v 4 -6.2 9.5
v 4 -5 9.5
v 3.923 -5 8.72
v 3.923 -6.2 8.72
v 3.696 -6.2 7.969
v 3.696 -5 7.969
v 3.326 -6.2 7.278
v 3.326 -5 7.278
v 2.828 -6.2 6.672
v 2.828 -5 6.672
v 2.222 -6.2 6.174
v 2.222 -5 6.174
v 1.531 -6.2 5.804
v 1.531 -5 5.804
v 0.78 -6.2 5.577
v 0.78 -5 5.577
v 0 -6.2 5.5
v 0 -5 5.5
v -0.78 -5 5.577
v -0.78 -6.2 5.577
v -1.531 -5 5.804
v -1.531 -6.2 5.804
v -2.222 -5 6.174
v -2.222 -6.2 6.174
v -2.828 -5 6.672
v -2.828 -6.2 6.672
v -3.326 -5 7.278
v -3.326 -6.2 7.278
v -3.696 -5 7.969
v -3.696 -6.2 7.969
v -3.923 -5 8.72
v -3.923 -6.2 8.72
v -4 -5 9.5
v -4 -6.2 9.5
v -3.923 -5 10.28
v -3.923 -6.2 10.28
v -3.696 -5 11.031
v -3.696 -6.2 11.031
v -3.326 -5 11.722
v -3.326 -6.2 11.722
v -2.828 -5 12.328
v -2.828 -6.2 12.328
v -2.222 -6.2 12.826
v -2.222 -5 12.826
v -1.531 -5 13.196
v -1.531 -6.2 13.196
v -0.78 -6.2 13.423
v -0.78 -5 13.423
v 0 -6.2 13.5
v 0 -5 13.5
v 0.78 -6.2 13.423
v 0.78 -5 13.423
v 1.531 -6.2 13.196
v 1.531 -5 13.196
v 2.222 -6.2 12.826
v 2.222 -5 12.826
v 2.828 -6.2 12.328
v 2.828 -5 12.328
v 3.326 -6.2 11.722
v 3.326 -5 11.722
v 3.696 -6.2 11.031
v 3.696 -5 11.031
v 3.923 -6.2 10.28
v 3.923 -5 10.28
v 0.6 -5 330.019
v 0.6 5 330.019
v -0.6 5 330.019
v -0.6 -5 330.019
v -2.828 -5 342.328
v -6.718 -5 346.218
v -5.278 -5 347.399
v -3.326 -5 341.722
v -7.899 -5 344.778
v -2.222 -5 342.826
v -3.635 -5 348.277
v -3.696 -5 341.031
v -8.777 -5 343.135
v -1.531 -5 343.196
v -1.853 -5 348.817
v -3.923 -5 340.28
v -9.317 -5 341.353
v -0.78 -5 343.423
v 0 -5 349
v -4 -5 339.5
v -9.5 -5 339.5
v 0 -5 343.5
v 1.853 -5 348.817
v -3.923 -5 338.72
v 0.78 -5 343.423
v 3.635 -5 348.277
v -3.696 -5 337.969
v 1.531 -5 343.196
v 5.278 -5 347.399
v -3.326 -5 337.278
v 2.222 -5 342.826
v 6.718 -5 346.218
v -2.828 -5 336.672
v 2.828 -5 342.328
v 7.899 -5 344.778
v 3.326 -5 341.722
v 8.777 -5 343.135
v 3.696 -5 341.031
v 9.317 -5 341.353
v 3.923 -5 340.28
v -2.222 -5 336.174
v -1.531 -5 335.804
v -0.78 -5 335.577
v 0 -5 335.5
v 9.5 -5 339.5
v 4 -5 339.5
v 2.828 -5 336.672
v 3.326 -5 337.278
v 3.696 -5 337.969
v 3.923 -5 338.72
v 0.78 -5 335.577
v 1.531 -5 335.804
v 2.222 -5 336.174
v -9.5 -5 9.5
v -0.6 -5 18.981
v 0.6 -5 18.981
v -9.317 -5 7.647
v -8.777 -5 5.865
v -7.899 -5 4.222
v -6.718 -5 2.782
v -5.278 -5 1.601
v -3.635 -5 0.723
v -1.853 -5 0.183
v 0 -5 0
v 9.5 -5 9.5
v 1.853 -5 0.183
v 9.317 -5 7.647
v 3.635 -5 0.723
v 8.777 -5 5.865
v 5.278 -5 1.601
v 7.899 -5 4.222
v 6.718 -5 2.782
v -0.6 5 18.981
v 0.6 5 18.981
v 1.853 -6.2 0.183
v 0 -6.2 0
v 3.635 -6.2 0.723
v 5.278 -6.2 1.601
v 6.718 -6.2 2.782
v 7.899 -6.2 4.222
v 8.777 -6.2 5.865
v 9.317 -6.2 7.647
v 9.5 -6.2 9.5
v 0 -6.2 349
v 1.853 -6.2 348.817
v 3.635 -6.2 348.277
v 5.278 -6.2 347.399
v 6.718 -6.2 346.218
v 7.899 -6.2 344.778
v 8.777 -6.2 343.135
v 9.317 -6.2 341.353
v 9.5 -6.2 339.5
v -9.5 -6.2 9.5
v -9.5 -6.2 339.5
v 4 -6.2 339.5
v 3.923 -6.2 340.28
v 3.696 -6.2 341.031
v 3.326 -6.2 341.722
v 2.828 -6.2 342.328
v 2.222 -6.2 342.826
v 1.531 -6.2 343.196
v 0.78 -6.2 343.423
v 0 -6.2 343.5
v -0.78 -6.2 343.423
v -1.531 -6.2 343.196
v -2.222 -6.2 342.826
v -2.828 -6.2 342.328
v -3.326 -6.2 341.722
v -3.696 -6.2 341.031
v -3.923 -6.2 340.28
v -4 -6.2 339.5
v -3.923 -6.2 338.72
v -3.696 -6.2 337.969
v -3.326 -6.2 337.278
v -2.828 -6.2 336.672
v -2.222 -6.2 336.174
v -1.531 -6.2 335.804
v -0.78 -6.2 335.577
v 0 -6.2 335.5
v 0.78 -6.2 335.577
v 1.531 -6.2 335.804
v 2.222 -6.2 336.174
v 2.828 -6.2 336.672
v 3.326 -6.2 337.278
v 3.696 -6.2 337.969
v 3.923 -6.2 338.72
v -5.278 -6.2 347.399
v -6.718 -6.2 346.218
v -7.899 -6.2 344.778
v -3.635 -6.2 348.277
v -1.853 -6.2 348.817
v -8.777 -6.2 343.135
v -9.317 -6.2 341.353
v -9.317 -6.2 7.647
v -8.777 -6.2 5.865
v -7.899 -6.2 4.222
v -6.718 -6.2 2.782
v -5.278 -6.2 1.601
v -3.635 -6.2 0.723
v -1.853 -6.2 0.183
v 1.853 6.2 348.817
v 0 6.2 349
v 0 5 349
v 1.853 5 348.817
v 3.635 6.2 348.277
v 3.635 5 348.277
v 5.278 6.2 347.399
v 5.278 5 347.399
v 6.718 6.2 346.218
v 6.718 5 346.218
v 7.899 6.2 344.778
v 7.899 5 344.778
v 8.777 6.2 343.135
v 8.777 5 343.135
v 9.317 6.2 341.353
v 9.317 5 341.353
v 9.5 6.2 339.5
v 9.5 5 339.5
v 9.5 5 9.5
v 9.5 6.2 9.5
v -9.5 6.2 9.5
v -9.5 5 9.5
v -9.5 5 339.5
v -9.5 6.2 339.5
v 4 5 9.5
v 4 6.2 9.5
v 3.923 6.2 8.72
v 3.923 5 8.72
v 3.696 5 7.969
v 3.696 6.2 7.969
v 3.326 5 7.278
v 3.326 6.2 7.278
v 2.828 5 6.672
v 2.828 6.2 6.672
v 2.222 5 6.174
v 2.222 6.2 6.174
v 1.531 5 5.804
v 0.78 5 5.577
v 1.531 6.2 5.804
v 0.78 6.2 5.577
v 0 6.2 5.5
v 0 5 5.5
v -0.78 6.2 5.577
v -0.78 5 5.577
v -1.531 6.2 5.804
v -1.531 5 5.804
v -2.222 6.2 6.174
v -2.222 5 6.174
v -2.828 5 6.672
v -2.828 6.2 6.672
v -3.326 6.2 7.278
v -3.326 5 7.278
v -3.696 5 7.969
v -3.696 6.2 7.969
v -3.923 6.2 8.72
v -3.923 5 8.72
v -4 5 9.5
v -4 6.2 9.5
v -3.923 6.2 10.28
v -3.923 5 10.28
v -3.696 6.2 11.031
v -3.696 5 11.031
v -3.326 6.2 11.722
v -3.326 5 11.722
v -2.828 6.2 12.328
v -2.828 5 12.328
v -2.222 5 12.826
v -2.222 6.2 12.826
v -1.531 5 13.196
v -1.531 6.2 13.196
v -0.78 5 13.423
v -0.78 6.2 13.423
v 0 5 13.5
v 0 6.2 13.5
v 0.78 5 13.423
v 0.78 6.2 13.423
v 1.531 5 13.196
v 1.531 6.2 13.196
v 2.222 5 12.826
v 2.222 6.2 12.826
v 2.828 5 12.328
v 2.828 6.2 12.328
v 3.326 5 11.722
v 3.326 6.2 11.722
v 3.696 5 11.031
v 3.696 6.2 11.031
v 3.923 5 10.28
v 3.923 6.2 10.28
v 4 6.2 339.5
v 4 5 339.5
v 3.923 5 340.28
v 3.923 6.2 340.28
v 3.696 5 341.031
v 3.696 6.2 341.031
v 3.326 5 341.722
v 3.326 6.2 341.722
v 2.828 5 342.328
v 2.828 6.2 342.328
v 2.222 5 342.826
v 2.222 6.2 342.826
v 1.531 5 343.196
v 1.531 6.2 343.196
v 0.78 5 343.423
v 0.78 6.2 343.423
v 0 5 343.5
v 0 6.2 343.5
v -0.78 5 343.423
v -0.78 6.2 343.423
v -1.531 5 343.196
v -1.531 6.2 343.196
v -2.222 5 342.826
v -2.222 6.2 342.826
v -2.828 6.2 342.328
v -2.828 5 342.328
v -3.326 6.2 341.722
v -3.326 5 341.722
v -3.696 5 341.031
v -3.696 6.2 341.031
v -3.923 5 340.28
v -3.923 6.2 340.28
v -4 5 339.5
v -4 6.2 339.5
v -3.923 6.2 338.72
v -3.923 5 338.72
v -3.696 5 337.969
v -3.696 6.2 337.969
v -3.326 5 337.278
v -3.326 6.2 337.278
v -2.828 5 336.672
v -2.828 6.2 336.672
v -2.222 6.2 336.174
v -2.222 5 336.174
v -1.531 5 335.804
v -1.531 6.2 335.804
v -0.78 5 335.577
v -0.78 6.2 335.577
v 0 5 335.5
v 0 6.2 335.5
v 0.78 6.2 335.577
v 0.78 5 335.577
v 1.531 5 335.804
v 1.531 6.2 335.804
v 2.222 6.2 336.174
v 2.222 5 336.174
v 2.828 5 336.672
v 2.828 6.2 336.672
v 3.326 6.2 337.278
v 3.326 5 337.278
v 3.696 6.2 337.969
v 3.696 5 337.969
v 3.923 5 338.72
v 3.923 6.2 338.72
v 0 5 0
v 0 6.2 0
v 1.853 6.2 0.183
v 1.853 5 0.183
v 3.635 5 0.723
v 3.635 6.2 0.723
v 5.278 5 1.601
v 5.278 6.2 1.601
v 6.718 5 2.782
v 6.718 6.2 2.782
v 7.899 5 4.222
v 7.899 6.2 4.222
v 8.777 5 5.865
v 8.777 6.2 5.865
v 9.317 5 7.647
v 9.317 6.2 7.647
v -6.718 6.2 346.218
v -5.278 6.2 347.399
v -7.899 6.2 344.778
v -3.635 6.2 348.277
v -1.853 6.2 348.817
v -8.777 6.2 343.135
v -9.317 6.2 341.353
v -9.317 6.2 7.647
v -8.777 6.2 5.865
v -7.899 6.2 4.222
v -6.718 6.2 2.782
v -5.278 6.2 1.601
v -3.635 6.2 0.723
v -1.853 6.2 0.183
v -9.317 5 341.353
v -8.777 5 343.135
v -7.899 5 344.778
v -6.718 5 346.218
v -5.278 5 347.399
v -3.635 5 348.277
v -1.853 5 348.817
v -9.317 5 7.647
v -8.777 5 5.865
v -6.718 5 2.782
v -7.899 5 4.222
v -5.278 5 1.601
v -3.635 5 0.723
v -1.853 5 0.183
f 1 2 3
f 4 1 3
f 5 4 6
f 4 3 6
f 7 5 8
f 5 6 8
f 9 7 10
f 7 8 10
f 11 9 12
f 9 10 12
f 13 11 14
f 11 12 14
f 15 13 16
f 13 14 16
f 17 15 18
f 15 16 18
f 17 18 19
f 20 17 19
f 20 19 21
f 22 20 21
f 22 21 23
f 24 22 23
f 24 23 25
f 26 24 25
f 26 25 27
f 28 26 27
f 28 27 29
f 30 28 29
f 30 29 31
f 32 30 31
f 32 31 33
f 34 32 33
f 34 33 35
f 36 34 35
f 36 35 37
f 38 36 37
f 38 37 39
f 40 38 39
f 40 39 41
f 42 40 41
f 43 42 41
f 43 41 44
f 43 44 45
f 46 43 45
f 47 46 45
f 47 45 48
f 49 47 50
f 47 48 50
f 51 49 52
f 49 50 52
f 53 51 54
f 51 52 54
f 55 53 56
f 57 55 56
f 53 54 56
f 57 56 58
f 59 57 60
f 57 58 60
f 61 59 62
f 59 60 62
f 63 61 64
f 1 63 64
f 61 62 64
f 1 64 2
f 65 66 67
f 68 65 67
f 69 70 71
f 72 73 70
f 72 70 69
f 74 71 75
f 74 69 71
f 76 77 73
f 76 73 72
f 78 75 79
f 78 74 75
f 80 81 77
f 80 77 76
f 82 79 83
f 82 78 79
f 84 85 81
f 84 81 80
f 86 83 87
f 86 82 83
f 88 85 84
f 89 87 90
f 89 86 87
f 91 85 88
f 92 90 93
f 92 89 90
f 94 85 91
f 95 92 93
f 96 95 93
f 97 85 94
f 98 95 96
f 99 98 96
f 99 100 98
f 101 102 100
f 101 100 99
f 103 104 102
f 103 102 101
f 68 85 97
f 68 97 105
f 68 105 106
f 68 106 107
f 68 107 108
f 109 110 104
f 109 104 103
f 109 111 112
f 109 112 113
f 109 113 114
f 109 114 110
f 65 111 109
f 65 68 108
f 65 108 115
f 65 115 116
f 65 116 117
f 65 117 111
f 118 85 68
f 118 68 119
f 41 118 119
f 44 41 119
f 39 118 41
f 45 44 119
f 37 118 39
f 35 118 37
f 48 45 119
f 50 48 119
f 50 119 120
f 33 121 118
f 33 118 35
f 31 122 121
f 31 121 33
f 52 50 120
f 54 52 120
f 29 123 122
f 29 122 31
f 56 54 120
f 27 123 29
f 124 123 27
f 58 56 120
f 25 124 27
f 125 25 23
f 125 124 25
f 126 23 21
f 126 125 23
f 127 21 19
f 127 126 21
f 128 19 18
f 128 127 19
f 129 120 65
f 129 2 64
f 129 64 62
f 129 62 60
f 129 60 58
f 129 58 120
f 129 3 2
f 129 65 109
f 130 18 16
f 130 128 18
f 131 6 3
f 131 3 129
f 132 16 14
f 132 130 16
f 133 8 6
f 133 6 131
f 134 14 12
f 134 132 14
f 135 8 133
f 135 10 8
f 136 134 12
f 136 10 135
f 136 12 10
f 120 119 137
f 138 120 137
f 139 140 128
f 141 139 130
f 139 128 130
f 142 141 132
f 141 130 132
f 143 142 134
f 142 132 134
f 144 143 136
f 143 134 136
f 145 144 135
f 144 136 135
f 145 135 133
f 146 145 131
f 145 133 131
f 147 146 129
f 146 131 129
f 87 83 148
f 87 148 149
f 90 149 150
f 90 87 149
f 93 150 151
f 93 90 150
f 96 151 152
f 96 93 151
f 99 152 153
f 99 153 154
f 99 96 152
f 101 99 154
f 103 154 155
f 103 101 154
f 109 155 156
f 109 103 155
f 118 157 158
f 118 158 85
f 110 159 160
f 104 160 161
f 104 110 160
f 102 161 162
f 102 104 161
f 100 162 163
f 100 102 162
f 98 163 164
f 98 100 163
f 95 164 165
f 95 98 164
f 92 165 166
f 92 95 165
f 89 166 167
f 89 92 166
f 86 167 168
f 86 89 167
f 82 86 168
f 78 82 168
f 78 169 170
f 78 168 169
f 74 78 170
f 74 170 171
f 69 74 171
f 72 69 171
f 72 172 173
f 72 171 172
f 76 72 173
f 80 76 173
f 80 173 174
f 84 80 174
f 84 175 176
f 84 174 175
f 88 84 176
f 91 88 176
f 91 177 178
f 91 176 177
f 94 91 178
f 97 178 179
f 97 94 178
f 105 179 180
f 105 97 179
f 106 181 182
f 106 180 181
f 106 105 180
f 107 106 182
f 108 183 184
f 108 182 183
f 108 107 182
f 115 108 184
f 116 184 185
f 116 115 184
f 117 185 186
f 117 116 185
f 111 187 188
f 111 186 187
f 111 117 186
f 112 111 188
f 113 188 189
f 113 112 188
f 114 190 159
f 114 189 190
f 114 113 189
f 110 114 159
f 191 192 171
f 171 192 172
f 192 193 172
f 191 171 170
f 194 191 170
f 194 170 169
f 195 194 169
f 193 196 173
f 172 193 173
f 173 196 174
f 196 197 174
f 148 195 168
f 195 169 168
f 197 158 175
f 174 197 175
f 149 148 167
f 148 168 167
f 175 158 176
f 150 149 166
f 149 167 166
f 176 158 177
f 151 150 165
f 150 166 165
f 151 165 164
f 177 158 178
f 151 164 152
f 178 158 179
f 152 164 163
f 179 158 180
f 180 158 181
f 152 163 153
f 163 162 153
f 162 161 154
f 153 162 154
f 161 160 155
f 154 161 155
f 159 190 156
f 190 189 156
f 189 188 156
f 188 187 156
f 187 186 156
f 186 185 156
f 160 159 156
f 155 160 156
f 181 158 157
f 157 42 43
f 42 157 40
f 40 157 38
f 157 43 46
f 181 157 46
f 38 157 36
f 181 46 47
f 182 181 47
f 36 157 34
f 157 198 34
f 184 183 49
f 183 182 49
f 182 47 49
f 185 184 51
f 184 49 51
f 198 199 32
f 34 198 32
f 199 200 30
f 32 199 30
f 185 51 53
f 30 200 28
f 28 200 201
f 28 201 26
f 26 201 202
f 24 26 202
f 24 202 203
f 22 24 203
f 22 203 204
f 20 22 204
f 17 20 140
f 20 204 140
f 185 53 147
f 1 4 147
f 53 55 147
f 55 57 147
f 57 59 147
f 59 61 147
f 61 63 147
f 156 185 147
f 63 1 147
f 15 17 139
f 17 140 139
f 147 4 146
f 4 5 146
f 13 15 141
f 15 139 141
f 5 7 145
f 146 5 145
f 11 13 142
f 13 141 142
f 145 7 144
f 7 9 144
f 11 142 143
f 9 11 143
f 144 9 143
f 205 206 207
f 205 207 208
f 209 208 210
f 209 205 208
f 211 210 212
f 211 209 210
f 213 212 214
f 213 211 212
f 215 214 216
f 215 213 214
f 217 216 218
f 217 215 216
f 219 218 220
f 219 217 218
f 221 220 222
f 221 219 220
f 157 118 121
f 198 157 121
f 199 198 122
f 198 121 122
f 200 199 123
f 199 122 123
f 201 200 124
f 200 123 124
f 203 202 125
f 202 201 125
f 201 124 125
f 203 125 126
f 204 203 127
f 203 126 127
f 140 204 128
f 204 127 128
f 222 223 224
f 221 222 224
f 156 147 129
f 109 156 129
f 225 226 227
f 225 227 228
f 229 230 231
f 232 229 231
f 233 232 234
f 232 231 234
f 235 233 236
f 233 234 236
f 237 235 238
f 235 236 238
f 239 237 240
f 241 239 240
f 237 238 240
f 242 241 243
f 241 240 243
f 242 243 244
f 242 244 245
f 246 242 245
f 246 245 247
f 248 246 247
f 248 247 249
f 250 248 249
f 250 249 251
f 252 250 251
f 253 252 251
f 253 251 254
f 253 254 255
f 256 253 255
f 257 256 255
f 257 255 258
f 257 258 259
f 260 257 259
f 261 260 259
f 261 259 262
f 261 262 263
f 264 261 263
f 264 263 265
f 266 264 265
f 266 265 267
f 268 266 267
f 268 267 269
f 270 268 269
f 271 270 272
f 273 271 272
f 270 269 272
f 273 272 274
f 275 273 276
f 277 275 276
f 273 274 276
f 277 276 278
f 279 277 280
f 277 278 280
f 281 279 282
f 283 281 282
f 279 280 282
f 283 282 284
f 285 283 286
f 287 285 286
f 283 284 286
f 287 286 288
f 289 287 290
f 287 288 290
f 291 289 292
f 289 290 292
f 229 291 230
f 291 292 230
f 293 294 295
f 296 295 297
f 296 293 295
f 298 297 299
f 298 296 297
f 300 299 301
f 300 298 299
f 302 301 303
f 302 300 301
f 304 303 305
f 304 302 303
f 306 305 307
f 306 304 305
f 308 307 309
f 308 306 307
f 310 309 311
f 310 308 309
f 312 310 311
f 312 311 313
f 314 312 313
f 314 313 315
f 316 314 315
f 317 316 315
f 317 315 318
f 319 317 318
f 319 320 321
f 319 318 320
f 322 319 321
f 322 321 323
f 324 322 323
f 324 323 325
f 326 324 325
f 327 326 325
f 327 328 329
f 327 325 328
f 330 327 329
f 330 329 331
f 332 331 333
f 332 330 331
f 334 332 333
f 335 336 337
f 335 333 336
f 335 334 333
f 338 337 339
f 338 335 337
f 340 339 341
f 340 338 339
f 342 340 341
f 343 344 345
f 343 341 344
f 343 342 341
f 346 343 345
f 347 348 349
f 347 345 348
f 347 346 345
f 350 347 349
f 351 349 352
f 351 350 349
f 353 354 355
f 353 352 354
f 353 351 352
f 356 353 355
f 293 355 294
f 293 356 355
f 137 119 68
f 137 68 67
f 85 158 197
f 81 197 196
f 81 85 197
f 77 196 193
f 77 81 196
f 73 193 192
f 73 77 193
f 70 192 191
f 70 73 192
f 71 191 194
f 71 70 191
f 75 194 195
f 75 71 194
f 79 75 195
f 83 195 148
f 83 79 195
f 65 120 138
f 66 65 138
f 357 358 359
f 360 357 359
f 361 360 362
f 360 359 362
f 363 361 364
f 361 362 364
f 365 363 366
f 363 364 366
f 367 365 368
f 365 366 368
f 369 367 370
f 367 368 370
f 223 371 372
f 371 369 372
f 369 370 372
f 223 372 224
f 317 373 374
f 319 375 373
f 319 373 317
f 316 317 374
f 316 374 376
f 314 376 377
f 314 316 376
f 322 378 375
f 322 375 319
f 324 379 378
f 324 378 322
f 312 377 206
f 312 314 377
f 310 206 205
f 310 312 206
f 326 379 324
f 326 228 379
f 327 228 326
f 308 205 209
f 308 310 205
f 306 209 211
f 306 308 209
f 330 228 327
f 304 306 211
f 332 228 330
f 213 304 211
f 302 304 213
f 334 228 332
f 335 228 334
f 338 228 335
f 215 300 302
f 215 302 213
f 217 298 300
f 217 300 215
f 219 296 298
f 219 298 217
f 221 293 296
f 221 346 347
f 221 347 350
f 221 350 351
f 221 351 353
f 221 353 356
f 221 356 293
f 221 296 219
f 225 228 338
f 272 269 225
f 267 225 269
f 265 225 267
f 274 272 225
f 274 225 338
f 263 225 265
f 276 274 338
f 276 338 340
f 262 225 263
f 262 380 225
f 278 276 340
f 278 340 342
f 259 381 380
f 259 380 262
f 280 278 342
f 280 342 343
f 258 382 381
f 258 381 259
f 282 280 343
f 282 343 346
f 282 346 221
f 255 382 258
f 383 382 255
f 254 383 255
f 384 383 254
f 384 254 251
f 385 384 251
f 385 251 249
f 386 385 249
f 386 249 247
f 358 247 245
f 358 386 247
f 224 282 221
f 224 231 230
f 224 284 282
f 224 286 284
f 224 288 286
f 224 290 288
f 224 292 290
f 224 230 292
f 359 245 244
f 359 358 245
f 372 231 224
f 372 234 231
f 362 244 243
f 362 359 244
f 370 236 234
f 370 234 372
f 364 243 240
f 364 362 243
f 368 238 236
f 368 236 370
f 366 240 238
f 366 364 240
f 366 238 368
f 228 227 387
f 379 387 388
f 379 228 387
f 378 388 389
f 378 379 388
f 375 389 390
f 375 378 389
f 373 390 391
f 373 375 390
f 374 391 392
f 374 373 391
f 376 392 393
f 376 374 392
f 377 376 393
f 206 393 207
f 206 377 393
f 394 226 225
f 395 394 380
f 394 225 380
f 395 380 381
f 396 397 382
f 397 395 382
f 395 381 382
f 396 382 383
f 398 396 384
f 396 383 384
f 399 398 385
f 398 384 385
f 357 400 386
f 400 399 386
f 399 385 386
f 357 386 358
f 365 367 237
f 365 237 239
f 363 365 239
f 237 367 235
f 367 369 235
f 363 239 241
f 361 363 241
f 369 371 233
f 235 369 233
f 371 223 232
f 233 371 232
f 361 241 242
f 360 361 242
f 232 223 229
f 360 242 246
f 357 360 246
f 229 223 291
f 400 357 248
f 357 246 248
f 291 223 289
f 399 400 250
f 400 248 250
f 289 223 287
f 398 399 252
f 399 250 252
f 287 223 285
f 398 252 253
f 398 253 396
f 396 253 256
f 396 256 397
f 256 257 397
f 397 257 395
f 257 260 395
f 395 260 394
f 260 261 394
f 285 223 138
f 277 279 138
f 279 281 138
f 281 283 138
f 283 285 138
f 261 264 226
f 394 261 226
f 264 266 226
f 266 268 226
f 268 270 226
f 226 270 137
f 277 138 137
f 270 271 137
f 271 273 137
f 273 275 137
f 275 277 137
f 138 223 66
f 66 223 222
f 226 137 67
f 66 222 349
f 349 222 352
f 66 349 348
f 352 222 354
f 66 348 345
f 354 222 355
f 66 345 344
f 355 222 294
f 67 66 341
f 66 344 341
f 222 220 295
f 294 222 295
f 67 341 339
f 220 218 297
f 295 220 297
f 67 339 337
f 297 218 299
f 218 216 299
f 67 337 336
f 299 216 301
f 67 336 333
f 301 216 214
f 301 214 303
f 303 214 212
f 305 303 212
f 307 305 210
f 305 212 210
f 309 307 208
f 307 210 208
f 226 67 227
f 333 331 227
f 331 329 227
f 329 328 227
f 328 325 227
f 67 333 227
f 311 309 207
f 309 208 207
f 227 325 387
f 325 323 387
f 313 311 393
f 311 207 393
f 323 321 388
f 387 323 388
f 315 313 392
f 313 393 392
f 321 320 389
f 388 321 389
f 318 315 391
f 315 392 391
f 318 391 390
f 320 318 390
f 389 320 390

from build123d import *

# Parameters (mm, degrees)
SKETCH1_W           = 1.2
SKETCH1_H           = 10
SKETCH1_W_2         = 19
SKETCH1_H_2         = 1.2
BOSS_EXTRUDE1_DEPTH = 349
SKETCH3_R           = 4
CUT_EXTRUDE2_DEPTH  = 370
SKETCH6_W           = 18.962067398
SKETCH6_H           = 10
CUT_EXTRUDE4_DEPTH  = 370
SKETCH10_W          = 1.2
SKETCH10_H          = 10
CUT_EXTRUDE5_DEPTH  = 105


with BuildPart() as part:
    # Sketch1 → Boss-Extrude1 (new body)
    with BuildSketch(Plane.XY):
        Rectangle(SKETCH1_W, SKETCH1_H)
        with Locations((0, -5.6)):
            Rectangle(SKETCH1_W_2, SKETCH1_H_2)
        with Locations((0, 5.6)):
            Rectangle(SKETCH1_W_2, SKETCH1_H_2)
    extrude(amount=BOSS_EXTRUDE1_DEPTH)

    # Sketch3 → Cut-Extrude2 (cut)
    with BuildSketch(Plane(origin=(0, 6.2, 0), x_dir=(1, 0, 0), z_dir=(0, 1, 0))):
        with BuildLine():
            Line((-9.5, 0), (-9.5, -9.5))
            ThreePointArc((-9.5, -9.5), (-6.717514436, -2.782485594), (-4.2e-08, 0))
            Line((-4.2e-08, 0), (-9.5, 0))
        make_face()
        with BuildLine():
            Line((9.5, 0), (-4.2e-08, 0))
            ThreePointArc((-4.2e-08, 0), (6.717514406, -2.782485564), (9.5, -9.5))
            Line((9.5, -9.5), (9.5, 0))
        make_face()
        with BuildLine():
            ThreePointArc((14.5, -9.5), (0, 5), (-14.5, -9.5))
            Line((-14.5, -9.5), (-9.5, -9.5))
            Line((-9.5, -9.5), (-9.5, 0))
            Line((-9.5, 0), (-4.2e-08, 0))
            Line((-4.2e-08, 0), (9.5, 0))
            Line((9.5, 0), (9.5, -9.5))
            Line((9.5, -9.5), (14.5, -9.5))
        make_face()
        with Locations((0, -9.5)):
            Circle(SKETCH3_R)
    cut_extrude2 = extrude(amount=-CUT_EXTRUDE2_DEPTH, mode=Mode.SUBTRACT)

    # Mirror1: Cut-Extrude2 across plane
    add(cut_extrude2.mirror(Plane.XY.offset(174.5)), mode=Mode.SUBTRACT)

    # Sketch6 → Cut-Extrude4 (cut)
    with BuildSketch(Plane.ZY.offset(0.6)):
        with Locations((9.5, 0)):
            Rectangle(SKETCH6_W, SKETCH6_H)
    extrude(amount=-CUT_EXTRUDE4_DEPTH, mode=Mode.SUBTRACT)

    # Sketch10 → Cut-Extrude5 (cut)
    with BuildSketch(Plane(origin=(0, 0, 18.981033699), x_dir=(-1, 0, 0), z_dir=(0, 0, -1))):
        Rectangle(SKETCH10_W, SKETCH10_H)
    cut_extrude5 = extrude(amount=CUT_EXTRUDE5_DEPTH, mode=Mode.SUBTRACT)

    # Mirror2: Cut-Extrude5 across plane
    add(cut_extrude5.mirror(Plane.XY.offset(174.5)), mode=Mode.SUBTRACT)


solid = part.part
